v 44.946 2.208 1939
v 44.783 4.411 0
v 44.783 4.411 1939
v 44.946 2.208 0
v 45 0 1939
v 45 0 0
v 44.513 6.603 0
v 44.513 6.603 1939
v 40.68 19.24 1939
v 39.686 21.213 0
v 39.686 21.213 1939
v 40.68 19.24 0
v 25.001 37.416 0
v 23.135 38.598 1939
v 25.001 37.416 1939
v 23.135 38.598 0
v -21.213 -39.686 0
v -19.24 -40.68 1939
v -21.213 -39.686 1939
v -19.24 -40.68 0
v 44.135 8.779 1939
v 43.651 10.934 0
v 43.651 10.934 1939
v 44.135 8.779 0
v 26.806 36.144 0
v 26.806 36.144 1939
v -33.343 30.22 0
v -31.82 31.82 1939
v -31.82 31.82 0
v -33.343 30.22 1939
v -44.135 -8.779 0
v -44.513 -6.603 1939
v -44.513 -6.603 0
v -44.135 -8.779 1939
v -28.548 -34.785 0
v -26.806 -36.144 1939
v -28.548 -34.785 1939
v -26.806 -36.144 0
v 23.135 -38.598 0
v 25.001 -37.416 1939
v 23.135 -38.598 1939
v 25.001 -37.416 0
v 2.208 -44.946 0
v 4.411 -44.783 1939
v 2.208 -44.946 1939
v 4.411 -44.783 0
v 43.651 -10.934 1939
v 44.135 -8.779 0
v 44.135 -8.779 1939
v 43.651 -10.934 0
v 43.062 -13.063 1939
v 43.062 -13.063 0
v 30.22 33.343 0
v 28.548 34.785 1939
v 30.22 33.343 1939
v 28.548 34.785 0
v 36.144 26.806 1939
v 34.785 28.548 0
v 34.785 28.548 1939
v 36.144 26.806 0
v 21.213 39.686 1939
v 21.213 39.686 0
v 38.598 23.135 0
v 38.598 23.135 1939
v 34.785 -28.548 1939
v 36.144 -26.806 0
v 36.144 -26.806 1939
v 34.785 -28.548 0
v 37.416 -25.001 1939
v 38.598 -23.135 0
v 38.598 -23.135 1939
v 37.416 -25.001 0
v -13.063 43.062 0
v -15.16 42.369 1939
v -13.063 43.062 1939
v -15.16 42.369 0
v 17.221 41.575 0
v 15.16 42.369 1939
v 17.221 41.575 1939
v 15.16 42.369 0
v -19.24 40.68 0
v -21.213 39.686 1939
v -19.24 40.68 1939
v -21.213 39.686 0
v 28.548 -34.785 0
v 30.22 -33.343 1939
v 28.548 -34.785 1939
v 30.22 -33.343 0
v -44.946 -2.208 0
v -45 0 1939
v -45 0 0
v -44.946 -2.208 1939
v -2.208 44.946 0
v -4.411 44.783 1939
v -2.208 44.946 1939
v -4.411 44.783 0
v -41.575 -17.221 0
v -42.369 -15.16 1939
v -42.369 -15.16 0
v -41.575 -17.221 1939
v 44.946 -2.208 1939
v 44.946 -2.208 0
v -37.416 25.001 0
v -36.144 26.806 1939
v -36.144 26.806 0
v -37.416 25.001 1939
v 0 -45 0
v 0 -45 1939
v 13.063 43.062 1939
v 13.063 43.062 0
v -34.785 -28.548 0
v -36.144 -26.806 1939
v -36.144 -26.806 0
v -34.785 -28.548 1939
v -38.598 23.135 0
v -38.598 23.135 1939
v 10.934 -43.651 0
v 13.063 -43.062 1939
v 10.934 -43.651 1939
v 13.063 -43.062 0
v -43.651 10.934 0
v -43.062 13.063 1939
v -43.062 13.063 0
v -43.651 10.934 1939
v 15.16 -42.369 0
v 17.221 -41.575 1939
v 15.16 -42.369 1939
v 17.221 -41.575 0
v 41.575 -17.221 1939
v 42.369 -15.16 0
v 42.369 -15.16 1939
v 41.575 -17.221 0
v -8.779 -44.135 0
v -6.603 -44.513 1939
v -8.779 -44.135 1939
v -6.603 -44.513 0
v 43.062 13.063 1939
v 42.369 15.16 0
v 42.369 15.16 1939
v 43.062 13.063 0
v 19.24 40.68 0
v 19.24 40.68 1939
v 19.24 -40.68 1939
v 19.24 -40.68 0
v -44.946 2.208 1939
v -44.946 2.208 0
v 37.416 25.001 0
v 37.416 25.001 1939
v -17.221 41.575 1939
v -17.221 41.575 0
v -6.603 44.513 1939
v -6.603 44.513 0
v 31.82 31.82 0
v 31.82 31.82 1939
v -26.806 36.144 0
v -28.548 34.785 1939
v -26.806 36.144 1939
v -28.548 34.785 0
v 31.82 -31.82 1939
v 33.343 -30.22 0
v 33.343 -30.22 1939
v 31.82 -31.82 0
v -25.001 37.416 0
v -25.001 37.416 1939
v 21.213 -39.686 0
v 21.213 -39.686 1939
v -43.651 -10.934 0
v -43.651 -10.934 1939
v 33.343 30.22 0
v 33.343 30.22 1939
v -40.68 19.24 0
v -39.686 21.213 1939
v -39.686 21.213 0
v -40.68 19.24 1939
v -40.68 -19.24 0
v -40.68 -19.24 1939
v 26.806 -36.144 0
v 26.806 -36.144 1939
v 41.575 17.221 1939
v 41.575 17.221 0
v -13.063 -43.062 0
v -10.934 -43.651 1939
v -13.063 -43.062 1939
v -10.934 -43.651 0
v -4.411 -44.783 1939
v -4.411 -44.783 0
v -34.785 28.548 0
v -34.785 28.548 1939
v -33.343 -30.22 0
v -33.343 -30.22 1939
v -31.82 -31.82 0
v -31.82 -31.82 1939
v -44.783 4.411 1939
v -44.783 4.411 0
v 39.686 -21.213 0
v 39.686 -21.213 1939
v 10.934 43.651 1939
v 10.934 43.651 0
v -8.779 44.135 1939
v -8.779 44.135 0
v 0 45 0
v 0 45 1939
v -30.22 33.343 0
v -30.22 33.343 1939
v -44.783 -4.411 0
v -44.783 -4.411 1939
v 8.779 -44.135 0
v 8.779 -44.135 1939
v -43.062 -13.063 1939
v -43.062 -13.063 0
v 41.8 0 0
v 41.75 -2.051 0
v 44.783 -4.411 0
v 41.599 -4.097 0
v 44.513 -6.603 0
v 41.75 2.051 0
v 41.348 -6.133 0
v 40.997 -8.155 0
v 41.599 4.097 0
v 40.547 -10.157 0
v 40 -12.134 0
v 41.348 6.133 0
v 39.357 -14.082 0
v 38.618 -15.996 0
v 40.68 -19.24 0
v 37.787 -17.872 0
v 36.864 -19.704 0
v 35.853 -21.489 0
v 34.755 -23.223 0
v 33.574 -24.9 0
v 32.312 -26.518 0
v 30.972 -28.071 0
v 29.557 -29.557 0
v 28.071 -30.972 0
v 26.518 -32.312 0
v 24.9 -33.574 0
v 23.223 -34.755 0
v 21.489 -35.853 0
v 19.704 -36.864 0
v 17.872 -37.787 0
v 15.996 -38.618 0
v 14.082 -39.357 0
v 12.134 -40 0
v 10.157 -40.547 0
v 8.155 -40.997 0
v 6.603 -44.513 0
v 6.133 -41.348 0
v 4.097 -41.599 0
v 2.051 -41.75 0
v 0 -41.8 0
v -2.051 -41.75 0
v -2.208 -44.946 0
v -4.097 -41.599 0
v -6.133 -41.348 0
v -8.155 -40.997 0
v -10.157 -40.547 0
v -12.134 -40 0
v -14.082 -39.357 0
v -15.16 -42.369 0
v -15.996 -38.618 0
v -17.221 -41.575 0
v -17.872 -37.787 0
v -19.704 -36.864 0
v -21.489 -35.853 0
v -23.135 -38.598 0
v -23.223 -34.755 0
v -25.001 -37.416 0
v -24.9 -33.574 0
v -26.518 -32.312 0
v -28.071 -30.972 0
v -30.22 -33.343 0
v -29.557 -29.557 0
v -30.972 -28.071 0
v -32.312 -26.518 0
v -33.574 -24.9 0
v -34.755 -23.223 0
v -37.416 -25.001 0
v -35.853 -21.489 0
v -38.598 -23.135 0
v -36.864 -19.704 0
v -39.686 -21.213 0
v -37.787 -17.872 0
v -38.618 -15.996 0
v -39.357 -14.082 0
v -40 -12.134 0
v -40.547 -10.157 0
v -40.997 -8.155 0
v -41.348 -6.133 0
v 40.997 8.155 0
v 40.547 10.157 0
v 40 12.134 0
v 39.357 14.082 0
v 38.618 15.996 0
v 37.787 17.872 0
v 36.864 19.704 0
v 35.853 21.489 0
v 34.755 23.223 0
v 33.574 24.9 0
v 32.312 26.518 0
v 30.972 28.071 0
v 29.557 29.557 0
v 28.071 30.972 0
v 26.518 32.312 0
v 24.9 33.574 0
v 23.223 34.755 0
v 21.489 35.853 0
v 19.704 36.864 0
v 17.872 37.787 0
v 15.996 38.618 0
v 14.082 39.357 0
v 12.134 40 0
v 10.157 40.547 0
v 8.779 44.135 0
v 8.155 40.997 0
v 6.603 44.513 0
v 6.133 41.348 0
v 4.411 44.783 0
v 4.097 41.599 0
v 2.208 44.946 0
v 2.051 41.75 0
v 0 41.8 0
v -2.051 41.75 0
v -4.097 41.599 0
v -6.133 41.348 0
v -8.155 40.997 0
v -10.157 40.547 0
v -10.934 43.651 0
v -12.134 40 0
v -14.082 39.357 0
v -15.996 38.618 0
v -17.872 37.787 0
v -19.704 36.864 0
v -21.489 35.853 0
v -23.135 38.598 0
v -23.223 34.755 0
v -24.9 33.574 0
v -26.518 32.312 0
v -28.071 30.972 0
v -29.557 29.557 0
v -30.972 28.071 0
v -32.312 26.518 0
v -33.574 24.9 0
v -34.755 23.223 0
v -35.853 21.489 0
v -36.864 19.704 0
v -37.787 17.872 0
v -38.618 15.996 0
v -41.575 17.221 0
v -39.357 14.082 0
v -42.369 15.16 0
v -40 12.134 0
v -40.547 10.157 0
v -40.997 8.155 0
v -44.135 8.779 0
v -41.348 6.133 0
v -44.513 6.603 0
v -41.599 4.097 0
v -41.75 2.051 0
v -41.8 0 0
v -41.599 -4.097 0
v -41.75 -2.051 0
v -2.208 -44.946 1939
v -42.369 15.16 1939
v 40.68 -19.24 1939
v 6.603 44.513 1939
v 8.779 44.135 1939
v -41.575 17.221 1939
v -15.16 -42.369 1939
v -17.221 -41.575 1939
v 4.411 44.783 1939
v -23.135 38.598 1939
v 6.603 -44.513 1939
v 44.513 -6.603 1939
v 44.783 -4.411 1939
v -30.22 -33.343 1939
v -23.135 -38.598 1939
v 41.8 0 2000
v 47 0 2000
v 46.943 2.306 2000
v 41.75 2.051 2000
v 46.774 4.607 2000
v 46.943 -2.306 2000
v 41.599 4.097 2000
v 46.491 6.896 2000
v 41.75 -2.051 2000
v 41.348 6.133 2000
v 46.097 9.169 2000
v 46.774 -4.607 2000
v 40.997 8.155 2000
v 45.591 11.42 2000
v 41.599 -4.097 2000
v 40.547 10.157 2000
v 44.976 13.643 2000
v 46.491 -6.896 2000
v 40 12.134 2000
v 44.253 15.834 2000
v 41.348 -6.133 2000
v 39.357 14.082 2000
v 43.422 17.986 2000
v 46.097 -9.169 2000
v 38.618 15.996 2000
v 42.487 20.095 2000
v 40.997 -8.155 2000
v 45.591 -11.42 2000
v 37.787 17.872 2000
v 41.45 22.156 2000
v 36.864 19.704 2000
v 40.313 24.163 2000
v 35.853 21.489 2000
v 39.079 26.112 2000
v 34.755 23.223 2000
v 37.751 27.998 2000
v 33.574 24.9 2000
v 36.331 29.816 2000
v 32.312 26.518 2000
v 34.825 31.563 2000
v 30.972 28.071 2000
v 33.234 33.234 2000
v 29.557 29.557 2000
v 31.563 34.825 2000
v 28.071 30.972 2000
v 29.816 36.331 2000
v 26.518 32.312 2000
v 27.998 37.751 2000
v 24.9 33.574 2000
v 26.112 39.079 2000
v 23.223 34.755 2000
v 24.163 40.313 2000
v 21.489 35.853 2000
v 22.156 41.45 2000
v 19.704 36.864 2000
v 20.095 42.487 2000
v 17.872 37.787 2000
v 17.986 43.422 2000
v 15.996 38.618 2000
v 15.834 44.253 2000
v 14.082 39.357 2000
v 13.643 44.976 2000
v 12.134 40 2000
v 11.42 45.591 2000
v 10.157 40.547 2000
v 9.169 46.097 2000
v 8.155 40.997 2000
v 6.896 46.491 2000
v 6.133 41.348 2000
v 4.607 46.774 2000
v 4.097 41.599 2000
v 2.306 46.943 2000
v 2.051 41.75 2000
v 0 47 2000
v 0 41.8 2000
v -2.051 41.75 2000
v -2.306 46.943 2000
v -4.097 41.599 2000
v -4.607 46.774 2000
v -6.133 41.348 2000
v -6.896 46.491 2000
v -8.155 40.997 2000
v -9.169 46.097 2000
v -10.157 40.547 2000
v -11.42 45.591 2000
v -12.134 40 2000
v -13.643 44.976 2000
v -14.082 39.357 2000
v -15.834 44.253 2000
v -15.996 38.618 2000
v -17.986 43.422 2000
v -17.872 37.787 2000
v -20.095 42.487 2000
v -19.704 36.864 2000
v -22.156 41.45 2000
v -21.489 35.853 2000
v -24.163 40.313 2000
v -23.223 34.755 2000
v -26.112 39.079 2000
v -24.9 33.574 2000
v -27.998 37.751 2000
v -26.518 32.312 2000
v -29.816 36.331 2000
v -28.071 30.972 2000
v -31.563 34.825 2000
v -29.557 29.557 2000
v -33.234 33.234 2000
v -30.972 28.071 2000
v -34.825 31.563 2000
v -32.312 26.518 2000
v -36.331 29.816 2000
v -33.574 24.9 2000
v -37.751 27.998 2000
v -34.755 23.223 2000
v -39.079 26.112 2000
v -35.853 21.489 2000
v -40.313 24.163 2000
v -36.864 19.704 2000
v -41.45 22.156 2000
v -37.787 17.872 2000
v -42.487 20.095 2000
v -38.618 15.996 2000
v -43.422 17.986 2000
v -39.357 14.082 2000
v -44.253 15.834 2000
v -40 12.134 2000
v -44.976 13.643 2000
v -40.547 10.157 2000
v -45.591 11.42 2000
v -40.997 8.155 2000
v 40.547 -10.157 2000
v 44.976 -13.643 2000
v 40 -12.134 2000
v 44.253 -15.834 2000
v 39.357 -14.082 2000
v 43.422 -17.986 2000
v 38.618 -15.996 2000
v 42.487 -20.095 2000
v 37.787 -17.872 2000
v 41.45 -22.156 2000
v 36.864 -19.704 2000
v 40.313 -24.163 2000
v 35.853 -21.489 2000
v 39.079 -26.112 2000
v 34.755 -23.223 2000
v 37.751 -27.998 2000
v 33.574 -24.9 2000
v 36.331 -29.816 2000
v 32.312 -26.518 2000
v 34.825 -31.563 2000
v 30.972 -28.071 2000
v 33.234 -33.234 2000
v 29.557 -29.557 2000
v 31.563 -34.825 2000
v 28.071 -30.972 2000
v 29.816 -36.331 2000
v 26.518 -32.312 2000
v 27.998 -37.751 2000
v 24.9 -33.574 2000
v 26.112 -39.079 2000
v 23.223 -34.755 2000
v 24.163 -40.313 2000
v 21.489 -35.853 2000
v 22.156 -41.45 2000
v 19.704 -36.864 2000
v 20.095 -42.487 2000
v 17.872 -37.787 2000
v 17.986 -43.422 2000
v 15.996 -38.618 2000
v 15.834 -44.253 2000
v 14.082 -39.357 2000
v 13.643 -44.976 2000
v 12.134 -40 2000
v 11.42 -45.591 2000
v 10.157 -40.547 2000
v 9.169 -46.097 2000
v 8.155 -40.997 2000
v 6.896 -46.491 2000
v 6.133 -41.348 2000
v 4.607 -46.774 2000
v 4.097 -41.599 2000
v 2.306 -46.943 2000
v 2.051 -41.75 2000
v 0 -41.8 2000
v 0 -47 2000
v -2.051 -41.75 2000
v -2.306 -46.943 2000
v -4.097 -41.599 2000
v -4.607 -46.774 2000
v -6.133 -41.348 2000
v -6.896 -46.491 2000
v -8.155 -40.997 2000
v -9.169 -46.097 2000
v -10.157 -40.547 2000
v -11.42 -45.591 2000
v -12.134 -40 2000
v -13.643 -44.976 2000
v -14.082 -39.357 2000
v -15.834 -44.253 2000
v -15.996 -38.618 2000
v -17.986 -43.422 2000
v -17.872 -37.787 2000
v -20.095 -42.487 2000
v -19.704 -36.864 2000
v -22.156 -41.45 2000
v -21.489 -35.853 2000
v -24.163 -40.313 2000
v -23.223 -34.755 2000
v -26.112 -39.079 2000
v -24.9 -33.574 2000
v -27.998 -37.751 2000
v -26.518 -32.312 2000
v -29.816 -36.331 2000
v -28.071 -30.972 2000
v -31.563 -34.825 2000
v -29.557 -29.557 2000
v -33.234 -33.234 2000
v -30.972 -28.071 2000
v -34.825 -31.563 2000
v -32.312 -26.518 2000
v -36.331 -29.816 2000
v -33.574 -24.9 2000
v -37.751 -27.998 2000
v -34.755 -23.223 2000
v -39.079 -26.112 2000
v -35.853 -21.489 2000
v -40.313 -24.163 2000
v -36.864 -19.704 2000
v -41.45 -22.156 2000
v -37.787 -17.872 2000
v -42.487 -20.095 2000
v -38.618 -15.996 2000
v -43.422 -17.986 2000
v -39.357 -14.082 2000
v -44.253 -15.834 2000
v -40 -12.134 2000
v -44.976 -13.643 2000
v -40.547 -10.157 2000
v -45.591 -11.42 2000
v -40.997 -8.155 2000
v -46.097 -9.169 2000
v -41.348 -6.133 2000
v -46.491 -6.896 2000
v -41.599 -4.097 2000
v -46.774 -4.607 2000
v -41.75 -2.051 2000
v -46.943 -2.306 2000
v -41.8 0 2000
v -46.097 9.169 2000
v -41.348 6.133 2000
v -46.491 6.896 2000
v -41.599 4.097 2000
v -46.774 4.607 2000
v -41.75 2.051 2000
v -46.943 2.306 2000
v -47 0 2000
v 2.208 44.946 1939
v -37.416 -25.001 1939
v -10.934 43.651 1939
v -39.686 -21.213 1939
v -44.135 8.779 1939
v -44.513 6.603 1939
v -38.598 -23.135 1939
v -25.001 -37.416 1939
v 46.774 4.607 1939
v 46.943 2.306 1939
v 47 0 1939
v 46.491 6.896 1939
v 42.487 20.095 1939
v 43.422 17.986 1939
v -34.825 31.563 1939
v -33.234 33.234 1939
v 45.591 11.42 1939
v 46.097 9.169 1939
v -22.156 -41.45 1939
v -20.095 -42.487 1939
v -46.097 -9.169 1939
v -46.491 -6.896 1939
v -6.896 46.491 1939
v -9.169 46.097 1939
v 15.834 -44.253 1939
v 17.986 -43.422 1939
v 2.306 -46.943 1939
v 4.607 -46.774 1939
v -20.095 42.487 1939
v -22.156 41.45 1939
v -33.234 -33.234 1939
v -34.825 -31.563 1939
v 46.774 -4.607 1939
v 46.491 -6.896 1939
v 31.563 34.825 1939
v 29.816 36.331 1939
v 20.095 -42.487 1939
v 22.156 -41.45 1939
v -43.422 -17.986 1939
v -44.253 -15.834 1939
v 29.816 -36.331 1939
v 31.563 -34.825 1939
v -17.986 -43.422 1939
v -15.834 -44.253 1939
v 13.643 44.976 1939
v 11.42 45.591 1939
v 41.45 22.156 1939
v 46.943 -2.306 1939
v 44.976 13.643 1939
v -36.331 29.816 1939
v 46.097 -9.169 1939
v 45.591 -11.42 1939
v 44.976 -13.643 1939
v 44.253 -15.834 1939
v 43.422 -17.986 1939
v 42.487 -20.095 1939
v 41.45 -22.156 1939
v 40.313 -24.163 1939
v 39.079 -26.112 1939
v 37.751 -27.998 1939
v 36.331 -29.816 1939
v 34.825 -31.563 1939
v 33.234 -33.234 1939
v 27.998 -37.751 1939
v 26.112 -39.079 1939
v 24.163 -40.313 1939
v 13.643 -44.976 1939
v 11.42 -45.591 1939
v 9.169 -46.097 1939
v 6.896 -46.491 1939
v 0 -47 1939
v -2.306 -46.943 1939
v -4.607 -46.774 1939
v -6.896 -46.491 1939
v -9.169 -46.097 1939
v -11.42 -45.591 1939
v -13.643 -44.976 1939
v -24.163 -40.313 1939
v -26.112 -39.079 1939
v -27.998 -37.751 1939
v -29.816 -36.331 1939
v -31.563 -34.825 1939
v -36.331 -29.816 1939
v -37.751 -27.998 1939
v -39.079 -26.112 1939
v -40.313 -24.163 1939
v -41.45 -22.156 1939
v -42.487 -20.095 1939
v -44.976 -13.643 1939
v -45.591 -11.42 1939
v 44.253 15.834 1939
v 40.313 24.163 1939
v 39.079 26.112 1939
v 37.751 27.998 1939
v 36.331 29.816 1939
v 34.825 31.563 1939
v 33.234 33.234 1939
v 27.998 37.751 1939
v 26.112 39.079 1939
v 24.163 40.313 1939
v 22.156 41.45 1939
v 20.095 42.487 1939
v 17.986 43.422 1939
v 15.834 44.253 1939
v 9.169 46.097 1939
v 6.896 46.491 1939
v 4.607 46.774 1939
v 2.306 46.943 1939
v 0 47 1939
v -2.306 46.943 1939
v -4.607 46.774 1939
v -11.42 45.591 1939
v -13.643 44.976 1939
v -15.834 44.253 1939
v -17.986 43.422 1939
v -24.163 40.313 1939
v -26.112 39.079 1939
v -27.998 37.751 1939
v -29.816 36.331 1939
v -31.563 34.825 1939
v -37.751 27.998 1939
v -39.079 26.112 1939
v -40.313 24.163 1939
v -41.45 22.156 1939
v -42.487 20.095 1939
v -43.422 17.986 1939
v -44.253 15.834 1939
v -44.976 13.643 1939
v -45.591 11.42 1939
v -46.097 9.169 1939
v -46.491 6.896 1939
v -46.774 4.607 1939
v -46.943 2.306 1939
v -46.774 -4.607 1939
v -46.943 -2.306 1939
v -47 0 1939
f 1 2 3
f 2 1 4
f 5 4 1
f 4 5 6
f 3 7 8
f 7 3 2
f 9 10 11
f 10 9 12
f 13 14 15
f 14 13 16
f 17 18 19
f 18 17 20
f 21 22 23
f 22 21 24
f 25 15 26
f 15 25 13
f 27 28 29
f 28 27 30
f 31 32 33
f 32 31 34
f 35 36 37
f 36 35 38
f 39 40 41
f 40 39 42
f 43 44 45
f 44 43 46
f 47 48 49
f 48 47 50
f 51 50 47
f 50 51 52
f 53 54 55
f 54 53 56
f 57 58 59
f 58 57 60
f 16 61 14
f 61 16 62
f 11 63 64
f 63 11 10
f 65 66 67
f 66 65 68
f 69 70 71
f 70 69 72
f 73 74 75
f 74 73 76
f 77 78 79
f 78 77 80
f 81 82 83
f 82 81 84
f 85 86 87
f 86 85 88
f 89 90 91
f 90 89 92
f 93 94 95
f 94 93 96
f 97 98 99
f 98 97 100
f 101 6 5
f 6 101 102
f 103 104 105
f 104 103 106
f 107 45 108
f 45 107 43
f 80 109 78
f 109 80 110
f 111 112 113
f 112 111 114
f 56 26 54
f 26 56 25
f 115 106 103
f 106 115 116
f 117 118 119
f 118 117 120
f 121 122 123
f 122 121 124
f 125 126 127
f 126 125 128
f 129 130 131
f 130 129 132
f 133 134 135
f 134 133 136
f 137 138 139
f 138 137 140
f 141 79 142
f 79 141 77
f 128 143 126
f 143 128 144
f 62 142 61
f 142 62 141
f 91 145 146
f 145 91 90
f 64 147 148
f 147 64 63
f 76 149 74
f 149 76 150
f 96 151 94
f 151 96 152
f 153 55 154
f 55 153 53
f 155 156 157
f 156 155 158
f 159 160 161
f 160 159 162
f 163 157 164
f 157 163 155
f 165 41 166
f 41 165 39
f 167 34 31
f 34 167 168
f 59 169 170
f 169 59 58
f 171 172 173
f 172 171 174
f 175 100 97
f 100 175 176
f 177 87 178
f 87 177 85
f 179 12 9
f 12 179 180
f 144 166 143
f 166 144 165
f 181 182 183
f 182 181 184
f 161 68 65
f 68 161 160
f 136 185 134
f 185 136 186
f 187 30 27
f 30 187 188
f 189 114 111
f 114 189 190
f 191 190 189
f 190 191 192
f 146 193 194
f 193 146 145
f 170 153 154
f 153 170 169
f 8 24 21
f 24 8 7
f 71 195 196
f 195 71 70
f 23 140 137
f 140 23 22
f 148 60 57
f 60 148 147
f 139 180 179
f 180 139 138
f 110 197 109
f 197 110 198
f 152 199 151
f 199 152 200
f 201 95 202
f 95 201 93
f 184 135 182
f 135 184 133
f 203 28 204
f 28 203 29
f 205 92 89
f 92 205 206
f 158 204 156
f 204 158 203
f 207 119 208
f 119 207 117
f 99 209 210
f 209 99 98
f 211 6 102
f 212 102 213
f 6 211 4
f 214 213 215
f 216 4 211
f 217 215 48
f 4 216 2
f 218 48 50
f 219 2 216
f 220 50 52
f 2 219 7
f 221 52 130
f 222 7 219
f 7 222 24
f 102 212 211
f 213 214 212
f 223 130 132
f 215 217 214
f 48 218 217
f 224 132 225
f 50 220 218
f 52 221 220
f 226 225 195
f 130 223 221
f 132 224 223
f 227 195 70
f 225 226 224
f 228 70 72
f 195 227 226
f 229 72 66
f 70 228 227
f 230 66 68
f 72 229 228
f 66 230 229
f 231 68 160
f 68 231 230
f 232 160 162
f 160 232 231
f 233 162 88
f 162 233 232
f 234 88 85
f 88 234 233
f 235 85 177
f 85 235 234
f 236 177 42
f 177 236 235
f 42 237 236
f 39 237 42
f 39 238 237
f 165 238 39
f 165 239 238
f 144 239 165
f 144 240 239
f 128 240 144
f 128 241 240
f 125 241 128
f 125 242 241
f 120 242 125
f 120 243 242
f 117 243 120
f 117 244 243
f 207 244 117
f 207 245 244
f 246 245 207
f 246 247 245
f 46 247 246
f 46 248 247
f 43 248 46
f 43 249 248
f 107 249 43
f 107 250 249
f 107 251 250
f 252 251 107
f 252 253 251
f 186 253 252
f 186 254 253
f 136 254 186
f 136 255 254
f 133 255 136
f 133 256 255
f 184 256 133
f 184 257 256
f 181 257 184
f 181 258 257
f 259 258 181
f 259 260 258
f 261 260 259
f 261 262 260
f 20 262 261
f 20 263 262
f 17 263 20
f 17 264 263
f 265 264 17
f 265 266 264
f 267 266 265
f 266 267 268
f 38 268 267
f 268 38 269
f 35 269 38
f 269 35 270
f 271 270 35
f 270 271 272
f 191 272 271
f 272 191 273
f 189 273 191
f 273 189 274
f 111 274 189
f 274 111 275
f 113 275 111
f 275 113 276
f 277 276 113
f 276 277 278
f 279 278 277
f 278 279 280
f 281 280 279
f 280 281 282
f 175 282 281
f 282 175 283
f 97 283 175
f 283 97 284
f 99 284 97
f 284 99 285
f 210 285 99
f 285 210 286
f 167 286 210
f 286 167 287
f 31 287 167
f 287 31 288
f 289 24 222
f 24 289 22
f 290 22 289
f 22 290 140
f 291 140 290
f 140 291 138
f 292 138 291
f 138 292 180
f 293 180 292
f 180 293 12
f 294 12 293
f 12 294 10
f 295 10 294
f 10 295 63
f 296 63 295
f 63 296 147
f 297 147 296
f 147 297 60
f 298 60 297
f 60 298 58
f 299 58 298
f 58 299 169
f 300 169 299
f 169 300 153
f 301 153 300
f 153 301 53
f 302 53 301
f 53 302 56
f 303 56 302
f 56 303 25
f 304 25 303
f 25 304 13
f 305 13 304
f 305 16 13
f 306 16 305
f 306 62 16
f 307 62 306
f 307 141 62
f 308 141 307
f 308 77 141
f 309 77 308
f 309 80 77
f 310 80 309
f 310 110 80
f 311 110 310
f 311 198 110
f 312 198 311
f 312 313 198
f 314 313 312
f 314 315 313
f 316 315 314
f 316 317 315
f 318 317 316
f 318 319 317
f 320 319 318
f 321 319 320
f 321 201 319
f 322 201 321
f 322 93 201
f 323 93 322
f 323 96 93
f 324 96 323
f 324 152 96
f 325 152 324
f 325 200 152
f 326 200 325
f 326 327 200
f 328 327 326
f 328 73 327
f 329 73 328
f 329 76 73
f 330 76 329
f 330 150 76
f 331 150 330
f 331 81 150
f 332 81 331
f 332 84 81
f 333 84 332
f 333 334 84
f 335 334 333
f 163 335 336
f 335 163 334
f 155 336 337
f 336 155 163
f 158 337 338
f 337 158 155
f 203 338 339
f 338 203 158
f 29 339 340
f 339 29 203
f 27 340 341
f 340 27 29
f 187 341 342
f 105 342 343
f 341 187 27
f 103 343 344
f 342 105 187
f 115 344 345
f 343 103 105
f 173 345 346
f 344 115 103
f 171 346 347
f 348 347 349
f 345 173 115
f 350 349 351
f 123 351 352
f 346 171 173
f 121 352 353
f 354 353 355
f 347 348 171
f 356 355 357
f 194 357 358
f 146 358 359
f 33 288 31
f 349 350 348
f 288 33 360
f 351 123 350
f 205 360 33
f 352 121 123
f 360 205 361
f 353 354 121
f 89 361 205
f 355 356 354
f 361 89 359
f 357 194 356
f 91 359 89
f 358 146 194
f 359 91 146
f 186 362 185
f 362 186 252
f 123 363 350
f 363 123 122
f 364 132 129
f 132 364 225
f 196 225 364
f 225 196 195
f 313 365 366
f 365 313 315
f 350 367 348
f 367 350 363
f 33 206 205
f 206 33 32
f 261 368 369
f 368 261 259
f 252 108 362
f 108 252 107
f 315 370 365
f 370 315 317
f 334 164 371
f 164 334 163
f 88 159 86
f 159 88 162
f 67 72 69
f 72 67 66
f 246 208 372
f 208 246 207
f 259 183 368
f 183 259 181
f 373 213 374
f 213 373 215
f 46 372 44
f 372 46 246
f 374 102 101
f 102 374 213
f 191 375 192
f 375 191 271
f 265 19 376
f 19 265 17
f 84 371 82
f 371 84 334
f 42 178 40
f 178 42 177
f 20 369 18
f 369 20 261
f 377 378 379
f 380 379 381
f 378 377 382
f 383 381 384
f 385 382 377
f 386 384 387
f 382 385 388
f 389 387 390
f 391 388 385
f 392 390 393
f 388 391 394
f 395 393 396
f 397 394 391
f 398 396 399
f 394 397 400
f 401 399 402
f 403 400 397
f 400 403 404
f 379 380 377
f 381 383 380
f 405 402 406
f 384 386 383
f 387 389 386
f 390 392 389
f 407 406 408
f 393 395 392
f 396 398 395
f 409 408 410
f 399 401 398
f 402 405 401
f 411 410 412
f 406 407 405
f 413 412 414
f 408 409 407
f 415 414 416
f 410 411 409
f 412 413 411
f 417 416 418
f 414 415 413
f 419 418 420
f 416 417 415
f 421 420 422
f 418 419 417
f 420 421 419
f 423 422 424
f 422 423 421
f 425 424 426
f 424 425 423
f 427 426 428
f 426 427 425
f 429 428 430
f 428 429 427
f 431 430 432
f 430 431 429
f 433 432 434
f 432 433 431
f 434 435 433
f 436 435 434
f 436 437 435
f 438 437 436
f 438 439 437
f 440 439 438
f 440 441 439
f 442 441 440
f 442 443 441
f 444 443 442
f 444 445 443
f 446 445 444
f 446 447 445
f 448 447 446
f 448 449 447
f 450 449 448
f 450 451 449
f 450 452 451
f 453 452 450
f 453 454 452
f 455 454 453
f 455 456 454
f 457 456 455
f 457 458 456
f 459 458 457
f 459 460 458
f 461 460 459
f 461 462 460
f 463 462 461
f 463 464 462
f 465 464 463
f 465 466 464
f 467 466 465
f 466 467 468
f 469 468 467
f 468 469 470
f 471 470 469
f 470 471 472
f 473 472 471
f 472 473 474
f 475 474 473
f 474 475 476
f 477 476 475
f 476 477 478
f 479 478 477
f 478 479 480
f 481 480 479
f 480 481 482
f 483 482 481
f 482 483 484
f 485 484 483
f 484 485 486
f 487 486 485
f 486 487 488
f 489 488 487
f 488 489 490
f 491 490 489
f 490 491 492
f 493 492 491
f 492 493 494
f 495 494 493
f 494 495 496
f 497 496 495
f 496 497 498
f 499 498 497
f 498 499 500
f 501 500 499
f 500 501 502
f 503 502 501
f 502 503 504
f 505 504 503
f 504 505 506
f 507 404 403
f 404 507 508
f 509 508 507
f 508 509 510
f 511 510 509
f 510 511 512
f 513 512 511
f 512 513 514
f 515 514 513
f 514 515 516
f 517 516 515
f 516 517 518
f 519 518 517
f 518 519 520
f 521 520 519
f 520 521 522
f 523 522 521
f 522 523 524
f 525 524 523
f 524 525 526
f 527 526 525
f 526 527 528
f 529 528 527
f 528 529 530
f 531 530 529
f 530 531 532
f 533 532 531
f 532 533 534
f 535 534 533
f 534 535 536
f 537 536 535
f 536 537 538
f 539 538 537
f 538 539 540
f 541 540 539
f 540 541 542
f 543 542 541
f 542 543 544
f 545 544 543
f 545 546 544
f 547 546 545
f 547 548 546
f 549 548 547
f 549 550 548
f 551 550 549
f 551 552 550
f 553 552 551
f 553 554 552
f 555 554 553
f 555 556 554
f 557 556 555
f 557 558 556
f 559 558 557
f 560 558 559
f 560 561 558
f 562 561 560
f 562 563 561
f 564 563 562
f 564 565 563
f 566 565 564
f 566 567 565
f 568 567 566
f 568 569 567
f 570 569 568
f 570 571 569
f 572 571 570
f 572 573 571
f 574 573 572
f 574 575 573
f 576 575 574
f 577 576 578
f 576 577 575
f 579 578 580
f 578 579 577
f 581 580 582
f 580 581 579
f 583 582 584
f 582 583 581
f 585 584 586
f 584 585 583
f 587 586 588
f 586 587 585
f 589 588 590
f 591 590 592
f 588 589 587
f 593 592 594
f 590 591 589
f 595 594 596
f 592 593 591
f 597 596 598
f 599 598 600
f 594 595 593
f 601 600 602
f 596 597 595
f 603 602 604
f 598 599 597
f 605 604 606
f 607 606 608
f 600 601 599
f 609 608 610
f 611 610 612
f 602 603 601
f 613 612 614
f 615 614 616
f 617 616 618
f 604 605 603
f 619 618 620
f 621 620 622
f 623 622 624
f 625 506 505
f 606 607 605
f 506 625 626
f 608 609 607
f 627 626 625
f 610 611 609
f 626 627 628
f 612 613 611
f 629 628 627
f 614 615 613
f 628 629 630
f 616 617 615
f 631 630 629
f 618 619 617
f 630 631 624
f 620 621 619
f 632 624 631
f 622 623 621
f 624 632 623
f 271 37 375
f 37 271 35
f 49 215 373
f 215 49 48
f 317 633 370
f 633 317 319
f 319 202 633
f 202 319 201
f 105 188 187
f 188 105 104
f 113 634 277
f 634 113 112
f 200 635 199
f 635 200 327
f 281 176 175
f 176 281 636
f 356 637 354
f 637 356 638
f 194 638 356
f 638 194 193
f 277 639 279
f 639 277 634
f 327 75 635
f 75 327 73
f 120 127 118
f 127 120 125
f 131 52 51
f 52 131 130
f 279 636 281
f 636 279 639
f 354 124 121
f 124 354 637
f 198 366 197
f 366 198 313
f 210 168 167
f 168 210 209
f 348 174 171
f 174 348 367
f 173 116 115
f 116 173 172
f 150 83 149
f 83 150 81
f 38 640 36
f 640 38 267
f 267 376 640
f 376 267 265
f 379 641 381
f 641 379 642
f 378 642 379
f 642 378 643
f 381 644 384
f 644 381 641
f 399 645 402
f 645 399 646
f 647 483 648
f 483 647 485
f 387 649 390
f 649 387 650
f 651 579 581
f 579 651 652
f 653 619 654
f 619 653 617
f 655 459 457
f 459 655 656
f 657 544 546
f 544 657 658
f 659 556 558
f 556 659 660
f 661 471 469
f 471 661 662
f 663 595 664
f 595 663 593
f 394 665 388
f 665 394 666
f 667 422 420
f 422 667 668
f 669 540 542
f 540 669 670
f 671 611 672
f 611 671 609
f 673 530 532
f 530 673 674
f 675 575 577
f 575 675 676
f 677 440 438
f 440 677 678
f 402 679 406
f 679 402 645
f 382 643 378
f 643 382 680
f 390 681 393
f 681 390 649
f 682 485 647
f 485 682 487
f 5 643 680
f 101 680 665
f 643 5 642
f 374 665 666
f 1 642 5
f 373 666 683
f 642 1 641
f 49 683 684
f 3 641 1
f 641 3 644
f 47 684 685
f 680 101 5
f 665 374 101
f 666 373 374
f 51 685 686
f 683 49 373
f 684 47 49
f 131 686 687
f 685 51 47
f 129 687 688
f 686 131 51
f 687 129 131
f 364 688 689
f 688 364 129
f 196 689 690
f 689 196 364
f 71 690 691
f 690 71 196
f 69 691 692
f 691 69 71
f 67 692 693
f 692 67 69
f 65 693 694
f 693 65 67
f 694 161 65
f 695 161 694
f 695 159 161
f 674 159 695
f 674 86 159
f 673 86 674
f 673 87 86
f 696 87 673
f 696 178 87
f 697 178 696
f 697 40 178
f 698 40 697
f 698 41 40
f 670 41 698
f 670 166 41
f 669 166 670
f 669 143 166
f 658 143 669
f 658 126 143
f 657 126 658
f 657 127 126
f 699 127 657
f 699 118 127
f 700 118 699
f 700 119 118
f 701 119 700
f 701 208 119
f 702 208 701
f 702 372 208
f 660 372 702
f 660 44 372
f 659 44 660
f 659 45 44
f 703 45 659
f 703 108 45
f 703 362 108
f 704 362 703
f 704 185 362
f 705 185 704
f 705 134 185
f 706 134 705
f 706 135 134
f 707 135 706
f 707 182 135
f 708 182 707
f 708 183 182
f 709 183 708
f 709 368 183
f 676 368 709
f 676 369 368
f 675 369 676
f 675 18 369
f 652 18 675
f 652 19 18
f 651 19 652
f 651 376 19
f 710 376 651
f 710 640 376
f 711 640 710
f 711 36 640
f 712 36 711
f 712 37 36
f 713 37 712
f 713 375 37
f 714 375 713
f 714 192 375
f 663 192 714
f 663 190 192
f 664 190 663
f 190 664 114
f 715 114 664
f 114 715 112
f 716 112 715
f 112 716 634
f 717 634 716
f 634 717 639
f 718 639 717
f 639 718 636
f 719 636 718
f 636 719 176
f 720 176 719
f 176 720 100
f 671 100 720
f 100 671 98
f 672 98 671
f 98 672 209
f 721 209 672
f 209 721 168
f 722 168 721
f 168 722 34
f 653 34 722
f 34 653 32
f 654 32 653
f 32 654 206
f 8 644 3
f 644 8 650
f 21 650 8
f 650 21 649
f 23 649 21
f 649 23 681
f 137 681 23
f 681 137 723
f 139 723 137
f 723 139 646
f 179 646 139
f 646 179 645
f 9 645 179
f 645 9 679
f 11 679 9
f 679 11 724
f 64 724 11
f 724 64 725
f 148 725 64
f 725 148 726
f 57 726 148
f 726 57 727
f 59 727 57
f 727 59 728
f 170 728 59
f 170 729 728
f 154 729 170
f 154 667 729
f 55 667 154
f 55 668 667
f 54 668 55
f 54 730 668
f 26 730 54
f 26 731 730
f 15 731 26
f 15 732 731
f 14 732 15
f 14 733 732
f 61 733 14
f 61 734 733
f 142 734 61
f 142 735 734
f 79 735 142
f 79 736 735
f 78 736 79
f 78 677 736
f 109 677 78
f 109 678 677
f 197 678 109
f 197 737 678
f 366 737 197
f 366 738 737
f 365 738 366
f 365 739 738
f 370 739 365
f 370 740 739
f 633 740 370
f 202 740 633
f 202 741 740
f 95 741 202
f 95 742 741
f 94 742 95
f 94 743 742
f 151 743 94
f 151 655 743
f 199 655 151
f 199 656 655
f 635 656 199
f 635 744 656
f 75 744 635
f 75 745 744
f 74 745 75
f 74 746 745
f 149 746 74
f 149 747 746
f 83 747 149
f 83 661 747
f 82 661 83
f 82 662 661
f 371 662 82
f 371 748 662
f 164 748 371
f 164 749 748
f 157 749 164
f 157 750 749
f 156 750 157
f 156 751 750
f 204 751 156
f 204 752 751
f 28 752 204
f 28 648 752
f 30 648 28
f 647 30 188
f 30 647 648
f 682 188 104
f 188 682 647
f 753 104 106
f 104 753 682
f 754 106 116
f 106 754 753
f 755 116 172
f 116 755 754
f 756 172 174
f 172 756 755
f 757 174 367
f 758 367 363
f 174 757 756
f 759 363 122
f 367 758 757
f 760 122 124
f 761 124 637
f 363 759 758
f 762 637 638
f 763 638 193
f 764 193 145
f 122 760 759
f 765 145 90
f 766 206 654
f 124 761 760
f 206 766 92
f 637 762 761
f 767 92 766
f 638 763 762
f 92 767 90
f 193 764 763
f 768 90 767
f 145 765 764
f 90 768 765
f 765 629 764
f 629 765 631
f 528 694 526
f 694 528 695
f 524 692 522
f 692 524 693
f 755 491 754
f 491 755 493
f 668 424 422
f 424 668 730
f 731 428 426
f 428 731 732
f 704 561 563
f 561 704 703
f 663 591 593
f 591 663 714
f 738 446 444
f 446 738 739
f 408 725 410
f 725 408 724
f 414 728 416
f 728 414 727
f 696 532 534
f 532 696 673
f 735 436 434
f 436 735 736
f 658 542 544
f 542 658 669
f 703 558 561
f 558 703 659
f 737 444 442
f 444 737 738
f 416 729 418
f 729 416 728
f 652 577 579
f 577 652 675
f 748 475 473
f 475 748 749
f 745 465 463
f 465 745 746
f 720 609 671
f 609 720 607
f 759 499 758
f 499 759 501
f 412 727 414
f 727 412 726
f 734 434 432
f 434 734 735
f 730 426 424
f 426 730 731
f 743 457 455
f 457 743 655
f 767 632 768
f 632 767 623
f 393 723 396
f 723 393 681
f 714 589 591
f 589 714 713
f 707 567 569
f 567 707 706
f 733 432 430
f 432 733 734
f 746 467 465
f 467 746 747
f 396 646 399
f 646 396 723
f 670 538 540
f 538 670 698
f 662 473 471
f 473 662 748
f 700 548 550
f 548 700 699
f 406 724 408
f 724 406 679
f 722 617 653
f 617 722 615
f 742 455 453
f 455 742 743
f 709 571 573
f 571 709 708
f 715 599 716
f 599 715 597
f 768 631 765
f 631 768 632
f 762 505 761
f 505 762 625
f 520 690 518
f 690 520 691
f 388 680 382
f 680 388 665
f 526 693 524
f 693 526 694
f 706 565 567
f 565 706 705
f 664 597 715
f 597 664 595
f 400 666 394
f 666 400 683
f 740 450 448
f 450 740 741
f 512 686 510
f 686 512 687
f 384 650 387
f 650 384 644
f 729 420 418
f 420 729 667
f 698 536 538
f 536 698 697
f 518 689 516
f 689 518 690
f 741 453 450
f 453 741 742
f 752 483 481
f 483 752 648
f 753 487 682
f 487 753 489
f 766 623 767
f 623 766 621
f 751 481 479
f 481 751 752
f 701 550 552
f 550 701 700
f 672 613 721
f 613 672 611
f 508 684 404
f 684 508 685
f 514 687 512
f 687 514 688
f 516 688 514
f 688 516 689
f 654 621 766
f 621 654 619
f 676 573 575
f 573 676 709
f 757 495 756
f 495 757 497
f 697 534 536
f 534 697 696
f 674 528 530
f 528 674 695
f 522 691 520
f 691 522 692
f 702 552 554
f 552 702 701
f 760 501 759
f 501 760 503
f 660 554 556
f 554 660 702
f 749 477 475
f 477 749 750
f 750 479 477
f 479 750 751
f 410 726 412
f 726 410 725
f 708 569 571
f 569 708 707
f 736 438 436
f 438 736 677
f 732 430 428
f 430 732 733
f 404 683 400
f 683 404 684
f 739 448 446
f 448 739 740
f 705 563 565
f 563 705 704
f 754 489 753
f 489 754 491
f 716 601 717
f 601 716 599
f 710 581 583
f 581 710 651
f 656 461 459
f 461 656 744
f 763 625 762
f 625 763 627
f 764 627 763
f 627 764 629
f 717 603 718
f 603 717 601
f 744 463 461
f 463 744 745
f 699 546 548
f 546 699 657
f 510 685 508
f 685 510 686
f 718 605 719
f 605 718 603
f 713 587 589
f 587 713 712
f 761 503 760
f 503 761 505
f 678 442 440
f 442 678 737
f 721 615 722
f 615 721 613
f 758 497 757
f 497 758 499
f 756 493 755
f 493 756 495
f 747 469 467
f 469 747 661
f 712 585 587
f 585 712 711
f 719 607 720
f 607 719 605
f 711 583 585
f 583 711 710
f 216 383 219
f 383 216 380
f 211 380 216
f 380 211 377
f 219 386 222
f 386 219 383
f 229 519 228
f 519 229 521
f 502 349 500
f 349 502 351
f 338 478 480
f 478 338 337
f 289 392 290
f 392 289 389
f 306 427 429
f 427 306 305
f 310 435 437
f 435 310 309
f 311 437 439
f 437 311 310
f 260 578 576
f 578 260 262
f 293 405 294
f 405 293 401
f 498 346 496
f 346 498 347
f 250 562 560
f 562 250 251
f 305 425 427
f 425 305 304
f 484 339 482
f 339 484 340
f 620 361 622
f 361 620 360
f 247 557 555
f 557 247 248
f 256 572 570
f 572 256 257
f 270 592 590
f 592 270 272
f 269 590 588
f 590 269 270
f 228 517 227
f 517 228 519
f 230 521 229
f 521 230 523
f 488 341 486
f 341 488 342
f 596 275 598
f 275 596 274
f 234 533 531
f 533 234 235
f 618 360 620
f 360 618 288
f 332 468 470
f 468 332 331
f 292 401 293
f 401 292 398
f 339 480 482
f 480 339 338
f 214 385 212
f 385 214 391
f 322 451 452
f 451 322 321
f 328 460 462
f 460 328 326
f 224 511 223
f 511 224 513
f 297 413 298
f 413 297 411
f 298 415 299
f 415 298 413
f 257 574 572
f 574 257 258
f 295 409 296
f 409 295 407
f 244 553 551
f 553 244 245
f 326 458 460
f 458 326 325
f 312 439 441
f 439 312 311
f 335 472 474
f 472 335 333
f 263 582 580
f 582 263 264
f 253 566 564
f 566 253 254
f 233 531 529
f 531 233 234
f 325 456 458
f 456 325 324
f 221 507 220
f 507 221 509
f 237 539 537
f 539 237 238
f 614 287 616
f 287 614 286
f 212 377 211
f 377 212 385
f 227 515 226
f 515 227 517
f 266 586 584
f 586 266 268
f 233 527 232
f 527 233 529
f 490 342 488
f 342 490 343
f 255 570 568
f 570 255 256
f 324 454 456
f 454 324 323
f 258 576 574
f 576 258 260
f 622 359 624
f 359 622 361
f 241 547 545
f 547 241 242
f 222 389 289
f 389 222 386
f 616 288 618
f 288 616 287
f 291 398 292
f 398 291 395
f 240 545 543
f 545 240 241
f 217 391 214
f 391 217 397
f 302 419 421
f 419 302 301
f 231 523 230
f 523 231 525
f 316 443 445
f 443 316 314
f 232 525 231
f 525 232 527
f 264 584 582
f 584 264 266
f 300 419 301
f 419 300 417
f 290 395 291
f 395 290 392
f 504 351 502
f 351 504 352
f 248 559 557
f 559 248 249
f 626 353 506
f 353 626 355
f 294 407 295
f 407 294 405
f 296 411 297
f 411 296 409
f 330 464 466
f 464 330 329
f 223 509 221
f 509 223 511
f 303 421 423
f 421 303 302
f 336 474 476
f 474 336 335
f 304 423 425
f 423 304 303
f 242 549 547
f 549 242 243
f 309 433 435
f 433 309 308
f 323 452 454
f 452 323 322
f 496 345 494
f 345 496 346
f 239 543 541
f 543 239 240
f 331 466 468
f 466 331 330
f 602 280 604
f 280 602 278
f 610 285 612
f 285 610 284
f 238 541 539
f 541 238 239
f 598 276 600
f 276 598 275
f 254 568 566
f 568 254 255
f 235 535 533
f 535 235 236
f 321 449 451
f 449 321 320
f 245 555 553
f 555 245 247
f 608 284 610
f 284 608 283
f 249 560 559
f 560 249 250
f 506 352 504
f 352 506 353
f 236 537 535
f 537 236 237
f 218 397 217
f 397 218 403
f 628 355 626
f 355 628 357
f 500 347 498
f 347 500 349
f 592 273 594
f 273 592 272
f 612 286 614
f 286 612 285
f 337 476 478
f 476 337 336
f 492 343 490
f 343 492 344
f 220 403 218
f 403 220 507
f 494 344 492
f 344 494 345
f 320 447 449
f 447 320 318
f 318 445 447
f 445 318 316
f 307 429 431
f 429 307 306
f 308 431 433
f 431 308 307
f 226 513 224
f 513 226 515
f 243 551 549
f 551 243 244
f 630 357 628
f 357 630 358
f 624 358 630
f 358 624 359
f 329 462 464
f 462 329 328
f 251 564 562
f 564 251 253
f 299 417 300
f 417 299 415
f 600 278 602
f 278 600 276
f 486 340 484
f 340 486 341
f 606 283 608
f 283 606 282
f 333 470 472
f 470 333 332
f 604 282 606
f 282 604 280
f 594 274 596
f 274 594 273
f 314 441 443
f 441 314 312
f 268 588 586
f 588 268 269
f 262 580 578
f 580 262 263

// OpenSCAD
// Parameters
nominal_diameter_mm = 90; //[45:180:1]
length_mm = 2000; //[1000:4000:10]
pipe_wall_mm = 3.2; //[1.6:6.4:0.1]
socket_length_mm = 60; //[30:120:1]
socket_wall_extra_mm = 2.0; //[0.5:6.0:0.1]
overlap_mm = 1.0; //[0.5:2.0:0.1]

$fn = 128;

// HT Pipe - one connected solid (hollow tube with one enlarged socket end)
module ht_pipe() {
    r_out = nominal_diameter_mm/2;
    r_in  = r_out - pipe_wall_mm;
    r_sock_out = r_out + socket_wall_extra_mm;

    // Ensure valid geometry
    r_in_safe = max(0.01, r_in);
    sock_len_safe = min(socket_length_mm, length_mm);

    // Socket starts slightly before the pipe end to guarantee overlap/connection
    z_sock0 = length_mm - sock_len_safe - overlap_mm;

    color([0.85, 0.85, 0.8])
    difference() {
        // OUTER solid: pipe + socket (unioned and overlapping)
        union() {
            cylinder(h=length_mm, r=r_out, center=false);

            translate([0, 0, z_sock0])
                cylinder(h=sock_len_safe + overlap_mm, r=r_sock_out, center=false);
        }

        // INNER void: continuous bore through entire length (including socket)
        translate([0, 0, -overlap_mm])
            cylinder(h=length_mm + 2*overlap_mm, r=r_in_safe, center=false);
    }
}

ht_pipe();
